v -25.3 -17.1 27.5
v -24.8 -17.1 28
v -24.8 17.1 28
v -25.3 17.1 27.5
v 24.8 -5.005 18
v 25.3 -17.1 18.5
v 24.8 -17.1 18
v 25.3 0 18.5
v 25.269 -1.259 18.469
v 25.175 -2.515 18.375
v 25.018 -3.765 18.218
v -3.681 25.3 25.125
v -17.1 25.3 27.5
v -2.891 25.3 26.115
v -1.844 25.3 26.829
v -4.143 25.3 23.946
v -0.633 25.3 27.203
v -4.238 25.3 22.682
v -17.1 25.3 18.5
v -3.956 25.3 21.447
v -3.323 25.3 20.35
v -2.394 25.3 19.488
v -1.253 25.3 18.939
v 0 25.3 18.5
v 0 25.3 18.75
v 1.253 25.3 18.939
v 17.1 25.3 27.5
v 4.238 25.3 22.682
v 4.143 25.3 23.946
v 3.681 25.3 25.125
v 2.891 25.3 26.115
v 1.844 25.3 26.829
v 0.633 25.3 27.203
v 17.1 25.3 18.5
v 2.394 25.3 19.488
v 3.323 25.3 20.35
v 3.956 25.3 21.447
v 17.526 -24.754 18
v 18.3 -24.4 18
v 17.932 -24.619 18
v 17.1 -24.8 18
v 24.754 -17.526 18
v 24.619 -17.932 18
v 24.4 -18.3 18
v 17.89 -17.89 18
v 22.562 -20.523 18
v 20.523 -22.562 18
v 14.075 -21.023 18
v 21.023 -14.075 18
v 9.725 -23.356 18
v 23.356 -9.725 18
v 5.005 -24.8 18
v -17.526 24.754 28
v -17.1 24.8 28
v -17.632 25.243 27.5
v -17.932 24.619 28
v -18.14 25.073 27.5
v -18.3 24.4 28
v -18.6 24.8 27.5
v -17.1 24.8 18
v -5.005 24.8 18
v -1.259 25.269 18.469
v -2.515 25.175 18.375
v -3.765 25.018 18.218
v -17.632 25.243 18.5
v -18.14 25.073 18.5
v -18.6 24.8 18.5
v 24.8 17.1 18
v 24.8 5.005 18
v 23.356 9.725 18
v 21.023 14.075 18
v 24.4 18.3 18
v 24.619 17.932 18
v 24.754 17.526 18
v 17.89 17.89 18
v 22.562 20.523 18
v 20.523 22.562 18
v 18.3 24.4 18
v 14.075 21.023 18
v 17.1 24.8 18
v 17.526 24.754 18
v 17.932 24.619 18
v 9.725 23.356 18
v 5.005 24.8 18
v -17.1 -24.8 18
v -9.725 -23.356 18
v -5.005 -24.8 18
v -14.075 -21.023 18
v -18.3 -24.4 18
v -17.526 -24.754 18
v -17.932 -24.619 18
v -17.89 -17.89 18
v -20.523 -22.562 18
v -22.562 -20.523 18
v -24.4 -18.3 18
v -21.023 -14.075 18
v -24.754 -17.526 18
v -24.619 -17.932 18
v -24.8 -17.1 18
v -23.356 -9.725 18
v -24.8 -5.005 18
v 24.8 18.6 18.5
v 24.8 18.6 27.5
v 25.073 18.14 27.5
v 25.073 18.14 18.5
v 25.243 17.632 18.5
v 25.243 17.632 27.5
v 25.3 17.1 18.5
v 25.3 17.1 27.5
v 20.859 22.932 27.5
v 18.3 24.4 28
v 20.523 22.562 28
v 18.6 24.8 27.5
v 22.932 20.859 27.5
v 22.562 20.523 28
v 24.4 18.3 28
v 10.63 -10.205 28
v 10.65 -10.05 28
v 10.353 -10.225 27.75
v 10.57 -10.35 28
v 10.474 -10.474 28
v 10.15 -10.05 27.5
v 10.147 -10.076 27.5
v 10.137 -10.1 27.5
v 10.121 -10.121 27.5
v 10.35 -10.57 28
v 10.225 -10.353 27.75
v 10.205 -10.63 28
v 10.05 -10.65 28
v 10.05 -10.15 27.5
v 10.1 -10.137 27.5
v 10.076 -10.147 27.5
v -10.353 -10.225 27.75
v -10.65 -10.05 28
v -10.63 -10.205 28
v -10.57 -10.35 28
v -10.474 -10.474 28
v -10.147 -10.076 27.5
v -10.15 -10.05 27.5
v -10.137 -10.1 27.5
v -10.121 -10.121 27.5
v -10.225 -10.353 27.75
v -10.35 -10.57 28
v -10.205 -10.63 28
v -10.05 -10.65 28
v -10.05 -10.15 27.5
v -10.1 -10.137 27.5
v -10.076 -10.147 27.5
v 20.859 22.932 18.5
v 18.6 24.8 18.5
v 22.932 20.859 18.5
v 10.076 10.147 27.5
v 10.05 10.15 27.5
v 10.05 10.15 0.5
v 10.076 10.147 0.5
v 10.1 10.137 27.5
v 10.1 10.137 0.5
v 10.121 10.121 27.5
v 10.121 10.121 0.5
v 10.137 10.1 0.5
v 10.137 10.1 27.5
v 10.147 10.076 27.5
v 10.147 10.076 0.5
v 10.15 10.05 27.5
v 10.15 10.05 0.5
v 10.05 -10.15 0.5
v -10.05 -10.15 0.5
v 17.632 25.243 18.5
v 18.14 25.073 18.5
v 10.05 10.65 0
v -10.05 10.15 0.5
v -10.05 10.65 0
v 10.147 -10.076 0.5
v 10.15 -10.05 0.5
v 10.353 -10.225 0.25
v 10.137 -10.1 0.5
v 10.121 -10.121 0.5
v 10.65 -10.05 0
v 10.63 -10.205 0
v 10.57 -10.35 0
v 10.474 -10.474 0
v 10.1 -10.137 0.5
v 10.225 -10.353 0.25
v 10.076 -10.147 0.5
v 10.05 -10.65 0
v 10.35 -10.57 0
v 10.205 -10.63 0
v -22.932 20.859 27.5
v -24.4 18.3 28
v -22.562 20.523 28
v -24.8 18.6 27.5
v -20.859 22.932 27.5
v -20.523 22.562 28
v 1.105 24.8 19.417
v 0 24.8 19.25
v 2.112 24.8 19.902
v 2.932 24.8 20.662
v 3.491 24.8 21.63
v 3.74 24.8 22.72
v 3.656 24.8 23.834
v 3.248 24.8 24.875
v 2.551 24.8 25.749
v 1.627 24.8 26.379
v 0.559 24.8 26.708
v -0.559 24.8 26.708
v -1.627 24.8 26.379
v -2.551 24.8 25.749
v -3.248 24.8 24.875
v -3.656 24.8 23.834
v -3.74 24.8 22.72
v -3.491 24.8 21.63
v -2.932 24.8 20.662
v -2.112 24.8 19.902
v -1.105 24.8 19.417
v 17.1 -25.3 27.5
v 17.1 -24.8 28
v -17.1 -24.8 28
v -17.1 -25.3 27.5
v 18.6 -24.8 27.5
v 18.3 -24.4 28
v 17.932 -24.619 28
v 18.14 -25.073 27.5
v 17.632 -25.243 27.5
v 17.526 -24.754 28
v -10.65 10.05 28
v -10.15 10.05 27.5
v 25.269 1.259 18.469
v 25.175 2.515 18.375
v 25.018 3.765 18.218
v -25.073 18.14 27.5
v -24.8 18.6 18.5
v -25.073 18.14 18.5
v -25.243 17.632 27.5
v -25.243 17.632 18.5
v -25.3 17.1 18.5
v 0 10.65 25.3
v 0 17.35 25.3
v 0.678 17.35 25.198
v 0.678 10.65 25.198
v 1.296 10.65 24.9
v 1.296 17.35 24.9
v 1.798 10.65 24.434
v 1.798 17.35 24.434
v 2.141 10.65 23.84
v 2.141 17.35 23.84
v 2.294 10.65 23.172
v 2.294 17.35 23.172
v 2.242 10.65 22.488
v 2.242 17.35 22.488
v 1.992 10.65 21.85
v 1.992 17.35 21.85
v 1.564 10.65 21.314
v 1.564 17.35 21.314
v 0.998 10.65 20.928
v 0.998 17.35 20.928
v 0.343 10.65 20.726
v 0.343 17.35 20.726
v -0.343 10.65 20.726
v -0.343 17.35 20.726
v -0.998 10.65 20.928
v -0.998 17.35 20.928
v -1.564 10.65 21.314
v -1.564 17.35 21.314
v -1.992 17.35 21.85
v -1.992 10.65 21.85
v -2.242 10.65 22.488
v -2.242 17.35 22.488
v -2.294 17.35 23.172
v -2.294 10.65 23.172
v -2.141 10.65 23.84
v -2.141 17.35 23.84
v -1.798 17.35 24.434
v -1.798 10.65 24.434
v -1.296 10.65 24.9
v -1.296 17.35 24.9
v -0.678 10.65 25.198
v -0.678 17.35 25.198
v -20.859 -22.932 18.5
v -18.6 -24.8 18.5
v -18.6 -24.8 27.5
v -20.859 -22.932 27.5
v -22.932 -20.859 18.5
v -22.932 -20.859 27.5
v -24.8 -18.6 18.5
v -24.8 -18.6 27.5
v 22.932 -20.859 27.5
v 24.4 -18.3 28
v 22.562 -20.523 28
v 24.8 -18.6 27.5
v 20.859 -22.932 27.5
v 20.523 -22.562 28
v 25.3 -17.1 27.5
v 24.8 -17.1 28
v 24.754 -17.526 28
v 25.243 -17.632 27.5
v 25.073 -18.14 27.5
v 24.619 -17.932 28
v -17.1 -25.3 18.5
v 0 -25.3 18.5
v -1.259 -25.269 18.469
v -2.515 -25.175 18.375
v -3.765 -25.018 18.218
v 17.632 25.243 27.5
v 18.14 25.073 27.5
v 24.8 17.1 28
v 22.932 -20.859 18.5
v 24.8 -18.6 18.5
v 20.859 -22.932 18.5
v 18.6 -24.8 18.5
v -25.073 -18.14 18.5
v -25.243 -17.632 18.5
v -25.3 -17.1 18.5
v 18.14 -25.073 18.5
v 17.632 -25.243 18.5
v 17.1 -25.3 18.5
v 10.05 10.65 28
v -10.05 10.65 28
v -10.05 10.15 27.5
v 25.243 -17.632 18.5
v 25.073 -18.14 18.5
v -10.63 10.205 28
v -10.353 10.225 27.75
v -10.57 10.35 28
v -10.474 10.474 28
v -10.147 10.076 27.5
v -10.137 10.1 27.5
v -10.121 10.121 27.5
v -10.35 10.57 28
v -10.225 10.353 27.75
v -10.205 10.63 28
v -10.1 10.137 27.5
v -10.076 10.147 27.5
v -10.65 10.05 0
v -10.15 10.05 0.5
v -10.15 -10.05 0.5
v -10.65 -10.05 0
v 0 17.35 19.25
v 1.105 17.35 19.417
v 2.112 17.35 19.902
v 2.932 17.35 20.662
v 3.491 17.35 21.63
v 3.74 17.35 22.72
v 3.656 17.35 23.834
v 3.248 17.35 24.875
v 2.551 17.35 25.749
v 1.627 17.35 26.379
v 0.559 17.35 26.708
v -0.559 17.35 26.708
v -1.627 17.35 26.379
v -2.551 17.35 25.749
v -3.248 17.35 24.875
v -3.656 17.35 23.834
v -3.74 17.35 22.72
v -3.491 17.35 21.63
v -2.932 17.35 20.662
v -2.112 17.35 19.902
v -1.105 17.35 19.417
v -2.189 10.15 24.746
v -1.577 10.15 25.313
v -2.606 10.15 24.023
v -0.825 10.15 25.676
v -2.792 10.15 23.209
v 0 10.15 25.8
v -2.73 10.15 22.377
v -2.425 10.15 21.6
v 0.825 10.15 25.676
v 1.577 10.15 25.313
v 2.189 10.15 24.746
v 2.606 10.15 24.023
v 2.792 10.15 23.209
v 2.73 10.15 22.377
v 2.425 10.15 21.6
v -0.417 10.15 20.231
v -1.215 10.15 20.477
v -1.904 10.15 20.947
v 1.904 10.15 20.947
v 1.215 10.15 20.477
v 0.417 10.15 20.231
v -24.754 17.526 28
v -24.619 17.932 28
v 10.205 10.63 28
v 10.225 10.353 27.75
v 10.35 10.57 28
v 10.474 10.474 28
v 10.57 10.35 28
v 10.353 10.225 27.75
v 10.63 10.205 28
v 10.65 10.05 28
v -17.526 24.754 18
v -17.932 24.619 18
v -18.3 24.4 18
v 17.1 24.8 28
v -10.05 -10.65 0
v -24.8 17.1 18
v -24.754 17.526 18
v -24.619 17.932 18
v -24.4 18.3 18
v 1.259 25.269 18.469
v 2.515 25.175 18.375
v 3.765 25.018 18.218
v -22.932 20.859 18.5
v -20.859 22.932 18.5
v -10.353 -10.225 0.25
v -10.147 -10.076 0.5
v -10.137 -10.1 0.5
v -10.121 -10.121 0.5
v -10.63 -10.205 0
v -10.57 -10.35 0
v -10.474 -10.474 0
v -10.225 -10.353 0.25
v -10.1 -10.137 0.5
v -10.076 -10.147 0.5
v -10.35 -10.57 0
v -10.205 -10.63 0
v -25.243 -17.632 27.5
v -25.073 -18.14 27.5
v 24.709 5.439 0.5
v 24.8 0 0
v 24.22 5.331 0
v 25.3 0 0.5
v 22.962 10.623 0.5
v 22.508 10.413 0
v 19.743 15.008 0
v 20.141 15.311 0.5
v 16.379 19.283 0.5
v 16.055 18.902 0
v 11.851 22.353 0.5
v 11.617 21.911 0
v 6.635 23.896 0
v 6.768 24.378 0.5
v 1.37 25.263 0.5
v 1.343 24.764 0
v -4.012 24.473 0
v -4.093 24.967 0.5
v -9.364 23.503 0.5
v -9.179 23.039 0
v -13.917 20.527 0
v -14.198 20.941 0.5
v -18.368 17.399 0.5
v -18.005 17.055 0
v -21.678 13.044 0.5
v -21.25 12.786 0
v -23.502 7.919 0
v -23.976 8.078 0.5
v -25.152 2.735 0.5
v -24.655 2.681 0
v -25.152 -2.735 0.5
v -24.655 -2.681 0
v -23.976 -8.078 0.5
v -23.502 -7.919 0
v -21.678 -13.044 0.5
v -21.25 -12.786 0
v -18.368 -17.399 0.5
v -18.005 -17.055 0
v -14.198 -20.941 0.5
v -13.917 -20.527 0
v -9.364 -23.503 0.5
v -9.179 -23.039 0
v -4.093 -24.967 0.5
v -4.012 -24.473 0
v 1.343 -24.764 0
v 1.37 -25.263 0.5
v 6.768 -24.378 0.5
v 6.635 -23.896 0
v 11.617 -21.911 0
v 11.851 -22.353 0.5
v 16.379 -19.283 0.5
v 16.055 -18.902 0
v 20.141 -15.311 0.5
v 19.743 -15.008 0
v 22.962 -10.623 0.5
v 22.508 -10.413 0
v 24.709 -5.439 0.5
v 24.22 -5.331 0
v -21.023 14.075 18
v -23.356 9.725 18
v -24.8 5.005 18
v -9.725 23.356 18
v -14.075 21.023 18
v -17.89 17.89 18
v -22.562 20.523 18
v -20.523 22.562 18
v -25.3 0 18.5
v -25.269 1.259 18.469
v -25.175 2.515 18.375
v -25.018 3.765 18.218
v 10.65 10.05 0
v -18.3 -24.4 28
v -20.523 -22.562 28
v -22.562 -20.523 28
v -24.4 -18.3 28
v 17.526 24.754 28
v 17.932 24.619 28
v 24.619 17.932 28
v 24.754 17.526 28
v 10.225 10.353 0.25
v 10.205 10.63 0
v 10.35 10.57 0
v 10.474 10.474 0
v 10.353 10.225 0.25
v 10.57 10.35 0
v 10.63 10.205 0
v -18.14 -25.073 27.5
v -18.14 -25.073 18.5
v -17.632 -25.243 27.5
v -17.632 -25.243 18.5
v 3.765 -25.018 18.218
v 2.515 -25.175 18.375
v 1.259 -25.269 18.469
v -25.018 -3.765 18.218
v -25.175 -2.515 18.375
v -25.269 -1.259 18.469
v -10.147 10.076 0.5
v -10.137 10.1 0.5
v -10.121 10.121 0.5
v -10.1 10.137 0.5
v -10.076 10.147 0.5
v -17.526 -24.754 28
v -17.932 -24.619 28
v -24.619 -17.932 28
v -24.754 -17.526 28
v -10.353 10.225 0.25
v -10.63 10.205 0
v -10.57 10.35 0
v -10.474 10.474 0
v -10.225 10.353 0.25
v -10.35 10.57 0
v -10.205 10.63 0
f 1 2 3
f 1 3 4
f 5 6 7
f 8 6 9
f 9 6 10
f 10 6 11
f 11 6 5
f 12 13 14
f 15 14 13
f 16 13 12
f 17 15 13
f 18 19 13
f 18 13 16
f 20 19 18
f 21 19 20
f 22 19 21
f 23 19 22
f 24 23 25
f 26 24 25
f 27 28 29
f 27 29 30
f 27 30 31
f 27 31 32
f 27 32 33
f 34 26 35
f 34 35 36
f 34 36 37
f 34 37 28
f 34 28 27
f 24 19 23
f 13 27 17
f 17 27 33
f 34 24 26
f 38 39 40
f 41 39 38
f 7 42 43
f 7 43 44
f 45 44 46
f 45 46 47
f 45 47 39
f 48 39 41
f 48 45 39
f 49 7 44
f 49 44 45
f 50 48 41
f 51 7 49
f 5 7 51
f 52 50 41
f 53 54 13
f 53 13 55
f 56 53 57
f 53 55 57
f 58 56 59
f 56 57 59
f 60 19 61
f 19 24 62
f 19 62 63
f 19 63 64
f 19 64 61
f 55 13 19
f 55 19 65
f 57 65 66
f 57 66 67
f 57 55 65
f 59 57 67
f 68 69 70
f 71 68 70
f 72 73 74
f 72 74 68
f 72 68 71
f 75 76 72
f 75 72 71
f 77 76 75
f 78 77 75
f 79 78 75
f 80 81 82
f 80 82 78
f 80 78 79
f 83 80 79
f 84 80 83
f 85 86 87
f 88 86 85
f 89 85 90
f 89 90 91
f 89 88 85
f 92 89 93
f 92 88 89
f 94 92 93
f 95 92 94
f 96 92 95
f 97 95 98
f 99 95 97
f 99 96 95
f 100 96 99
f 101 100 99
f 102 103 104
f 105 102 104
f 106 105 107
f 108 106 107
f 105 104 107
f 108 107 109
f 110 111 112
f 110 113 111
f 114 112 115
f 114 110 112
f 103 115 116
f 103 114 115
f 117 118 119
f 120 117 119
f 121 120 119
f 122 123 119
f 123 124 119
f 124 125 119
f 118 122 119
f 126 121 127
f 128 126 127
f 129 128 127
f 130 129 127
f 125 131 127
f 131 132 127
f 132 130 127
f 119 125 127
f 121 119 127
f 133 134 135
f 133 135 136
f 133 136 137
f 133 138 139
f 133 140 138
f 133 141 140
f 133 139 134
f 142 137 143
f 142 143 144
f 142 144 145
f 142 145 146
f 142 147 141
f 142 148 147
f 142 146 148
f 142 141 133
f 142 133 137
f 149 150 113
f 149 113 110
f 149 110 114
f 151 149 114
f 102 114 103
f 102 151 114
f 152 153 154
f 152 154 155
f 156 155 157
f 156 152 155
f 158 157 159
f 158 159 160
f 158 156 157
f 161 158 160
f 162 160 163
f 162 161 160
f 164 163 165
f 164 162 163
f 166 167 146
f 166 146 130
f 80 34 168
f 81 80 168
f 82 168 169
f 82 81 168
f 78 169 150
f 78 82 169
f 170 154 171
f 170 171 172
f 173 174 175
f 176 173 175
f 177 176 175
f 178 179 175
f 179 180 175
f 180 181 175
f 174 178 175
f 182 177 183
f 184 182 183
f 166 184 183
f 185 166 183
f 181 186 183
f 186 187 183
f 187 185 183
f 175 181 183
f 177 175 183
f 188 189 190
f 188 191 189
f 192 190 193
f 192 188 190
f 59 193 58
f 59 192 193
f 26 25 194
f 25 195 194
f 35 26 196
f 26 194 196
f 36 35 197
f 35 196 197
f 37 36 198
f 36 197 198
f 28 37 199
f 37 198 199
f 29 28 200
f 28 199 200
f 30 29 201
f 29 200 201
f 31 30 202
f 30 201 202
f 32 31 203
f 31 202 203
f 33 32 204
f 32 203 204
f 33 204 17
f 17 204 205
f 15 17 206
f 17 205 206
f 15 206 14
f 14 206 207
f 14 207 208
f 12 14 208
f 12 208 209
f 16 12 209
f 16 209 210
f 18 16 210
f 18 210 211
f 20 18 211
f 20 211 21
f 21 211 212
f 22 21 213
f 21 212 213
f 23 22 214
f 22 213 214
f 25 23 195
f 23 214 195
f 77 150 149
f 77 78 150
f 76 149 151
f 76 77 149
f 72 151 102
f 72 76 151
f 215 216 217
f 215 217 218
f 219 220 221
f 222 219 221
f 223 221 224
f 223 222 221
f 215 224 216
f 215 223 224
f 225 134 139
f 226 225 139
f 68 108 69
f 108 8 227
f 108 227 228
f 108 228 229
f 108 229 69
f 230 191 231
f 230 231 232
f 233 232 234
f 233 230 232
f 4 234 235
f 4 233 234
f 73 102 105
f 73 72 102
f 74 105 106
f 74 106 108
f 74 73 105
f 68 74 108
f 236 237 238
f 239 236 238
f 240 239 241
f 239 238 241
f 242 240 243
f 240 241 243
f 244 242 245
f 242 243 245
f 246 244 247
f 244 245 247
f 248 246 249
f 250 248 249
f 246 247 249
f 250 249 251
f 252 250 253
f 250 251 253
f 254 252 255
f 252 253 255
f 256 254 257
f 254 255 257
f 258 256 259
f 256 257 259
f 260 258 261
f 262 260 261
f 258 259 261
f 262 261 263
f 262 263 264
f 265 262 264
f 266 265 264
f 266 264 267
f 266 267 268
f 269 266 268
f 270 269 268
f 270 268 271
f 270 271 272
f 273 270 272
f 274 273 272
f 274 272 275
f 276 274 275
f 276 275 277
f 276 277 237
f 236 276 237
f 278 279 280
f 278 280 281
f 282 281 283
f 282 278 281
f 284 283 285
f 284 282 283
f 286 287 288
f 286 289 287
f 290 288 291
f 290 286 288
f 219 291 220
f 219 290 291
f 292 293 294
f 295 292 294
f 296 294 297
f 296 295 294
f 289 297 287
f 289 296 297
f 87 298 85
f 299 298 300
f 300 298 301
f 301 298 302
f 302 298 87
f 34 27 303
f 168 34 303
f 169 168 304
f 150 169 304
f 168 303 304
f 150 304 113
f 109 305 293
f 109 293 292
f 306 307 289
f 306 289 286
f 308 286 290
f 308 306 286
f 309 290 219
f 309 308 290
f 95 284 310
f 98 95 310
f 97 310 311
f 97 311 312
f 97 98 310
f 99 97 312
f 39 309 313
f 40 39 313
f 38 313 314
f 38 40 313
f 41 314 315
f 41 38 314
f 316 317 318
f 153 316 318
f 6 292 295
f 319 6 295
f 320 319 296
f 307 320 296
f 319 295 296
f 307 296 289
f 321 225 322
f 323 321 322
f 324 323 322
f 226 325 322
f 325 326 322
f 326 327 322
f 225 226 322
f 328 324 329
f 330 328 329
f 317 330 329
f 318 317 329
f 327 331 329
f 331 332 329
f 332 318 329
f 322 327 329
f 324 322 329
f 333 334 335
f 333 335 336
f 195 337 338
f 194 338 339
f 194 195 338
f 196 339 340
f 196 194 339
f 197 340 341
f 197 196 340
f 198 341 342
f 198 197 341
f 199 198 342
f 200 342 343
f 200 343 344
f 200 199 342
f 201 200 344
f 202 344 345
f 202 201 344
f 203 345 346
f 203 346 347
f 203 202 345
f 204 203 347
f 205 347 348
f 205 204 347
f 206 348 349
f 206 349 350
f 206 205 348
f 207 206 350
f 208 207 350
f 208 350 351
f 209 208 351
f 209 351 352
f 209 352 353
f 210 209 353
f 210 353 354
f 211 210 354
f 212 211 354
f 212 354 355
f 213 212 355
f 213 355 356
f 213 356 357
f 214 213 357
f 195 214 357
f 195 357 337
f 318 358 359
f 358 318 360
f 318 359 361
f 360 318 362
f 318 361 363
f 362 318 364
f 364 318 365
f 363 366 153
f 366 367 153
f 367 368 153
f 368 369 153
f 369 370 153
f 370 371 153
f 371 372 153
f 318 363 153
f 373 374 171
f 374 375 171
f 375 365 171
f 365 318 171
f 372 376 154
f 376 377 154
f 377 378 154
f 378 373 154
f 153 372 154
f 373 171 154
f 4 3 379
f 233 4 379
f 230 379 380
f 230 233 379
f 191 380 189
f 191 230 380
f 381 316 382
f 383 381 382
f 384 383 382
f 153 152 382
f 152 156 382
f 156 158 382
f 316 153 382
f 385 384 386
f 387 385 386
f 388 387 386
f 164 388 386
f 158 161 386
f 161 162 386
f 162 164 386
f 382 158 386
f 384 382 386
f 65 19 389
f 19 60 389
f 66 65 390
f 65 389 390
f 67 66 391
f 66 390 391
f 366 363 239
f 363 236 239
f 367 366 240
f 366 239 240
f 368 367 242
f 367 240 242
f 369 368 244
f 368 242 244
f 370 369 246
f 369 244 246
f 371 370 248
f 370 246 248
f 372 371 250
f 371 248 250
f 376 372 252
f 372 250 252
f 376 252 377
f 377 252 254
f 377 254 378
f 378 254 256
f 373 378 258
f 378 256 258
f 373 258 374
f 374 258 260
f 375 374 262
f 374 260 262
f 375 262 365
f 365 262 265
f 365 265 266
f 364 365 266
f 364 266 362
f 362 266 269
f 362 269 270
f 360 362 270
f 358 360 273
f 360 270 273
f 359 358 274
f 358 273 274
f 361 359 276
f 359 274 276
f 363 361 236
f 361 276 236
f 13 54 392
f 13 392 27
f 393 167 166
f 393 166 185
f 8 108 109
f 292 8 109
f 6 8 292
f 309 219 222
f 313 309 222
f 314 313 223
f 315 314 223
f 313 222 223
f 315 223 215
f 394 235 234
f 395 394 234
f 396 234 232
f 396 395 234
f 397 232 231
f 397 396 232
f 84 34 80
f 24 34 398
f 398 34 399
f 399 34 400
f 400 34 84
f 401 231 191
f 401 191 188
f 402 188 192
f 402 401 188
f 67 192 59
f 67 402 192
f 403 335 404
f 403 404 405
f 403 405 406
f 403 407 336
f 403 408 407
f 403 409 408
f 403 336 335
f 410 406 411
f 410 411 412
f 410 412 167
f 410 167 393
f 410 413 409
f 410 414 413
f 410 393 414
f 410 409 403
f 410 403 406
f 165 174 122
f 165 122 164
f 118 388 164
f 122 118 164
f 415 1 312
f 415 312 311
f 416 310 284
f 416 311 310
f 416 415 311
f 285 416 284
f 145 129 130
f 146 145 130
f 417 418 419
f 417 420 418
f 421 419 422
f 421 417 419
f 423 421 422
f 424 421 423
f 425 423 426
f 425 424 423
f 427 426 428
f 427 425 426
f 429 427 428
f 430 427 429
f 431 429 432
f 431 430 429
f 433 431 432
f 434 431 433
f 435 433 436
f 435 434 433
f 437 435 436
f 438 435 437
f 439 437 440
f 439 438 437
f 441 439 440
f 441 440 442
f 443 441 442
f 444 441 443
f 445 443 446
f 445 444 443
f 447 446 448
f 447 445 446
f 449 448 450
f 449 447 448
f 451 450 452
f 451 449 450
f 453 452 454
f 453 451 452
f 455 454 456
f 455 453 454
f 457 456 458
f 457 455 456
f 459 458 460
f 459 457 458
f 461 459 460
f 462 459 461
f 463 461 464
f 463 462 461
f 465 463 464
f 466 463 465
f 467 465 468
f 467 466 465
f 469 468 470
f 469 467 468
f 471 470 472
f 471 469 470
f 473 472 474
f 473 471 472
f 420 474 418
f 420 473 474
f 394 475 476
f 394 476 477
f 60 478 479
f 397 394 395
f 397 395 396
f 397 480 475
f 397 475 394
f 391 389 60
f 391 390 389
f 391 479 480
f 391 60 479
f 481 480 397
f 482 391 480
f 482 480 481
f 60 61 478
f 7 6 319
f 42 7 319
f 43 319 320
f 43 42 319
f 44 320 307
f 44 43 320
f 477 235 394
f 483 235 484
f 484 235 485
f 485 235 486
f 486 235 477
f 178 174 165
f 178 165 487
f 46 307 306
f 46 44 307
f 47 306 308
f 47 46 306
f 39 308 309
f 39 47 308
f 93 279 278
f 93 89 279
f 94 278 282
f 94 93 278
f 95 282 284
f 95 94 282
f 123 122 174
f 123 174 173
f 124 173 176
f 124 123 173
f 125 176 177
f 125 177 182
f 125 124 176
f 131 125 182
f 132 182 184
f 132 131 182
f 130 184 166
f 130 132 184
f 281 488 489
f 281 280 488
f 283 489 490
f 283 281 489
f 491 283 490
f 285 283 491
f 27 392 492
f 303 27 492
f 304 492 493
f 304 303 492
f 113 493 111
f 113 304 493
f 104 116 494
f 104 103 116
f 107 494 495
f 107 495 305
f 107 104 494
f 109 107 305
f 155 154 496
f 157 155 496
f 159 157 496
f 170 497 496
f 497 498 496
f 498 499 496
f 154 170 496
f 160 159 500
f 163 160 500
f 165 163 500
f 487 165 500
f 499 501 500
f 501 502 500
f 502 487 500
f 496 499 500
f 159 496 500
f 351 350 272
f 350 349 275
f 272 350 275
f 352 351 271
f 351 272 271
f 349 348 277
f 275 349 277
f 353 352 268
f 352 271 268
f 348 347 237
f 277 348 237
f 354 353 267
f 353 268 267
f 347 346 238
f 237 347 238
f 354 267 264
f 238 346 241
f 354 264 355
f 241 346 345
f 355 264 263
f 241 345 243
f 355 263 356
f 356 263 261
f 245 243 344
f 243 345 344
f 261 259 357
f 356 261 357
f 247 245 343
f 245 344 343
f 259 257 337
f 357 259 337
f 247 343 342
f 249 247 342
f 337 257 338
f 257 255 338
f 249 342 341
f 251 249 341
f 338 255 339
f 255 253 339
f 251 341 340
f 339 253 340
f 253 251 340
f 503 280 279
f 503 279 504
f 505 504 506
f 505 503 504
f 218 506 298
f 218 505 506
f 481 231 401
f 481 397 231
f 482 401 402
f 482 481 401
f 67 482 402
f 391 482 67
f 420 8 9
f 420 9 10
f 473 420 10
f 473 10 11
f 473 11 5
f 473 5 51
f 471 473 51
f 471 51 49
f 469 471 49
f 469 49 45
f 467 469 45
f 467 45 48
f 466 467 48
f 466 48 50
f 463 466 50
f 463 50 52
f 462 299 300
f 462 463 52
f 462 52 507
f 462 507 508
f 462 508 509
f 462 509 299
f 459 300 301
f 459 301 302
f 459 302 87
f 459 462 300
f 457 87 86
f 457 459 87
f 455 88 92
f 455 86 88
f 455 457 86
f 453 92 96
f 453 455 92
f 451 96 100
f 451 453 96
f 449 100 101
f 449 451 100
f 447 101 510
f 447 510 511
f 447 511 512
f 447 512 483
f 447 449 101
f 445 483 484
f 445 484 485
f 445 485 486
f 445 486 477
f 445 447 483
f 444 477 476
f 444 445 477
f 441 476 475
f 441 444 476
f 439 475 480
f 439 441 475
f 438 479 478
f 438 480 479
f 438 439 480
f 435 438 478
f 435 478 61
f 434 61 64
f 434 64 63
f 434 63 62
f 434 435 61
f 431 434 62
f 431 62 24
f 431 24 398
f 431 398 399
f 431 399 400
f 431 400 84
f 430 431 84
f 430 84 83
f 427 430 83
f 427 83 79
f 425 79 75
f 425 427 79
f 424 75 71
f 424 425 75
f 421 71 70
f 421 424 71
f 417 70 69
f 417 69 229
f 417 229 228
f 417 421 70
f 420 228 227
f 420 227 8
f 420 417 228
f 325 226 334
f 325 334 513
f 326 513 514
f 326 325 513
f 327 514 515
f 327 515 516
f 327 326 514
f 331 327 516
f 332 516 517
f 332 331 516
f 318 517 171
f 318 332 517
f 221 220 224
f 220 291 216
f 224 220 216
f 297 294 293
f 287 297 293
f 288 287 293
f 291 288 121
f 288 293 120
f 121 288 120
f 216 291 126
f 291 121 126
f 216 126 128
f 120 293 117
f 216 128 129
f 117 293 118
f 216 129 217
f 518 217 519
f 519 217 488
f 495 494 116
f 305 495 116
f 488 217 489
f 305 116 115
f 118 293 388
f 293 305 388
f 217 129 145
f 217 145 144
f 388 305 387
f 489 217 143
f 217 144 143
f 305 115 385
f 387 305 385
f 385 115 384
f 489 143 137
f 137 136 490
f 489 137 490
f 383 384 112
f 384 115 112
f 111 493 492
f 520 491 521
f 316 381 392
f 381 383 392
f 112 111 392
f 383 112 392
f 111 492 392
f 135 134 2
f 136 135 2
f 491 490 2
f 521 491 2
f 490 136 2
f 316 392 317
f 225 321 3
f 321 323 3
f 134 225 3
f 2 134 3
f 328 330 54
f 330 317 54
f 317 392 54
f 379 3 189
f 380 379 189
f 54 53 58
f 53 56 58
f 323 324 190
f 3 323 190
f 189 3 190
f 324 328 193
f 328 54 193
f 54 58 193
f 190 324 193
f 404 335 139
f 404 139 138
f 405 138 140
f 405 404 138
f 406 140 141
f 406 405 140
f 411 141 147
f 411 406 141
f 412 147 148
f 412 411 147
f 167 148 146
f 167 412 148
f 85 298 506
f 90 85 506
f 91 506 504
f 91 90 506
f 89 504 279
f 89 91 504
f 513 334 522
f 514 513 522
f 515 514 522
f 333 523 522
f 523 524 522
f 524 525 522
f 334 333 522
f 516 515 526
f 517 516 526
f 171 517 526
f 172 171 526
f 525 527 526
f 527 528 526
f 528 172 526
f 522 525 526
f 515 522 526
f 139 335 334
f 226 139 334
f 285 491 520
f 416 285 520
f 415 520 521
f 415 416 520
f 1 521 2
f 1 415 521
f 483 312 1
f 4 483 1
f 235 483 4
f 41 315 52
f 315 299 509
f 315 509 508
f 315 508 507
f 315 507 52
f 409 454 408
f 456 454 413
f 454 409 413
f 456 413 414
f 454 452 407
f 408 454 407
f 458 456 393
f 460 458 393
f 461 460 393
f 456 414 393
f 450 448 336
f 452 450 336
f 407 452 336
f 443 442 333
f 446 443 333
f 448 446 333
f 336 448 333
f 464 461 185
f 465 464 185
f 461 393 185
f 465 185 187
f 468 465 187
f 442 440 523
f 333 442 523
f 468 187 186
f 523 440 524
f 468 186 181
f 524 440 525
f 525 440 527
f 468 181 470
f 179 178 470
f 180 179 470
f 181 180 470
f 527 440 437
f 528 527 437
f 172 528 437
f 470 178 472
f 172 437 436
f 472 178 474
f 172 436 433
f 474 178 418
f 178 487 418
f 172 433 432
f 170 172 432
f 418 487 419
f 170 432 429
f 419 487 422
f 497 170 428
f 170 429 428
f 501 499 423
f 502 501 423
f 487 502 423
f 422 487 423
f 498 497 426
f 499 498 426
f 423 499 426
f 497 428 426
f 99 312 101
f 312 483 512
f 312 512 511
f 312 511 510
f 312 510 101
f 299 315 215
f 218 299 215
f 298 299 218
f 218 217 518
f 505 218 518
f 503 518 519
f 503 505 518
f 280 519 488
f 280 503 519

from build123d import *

# Parameters (mm, degrees)
SKIZZE1_R                       = 25.3
SKIZZE1_W                       = 20.3
SKIZZE1_H                       = 20.3
AUFSATZ_LINEAR_AUSTRAGEN1_DEPTH = 18
SKIZZE2_W                       = 20.3
SKIZZE2_H                       = 20.3
AUFSATZ_LINEAR_AUSTRAGEN2_DEPTH = 10
SCHNITT_LINEAR_AUSTRAGEN1_REACH = 65.122
SKIZZE3_R                       = 2.3
CUT_EXTRUDE2_START              = -50.6
SKETCH1_2_R                     = 3.75
CUT_EXTRUDE2_DEPTH              = 7.95
VERRUNDUNG1_R                   = 0.1
VERRUNDUNG2_R                   = 2.5
FASE1_SIZE                      = 0.5


with BuildPart() as part:
    # Skizze1 → Aufsatz-Linear austragen1 (new body)
    with BuildSketch(Plane.XY):
        Circle(SKIZZE1_R)
        Rectangle(SKIZZE1_W, SKIZZE1_H, mode=Mode.SUBTRACT)
    extrude(amount=AUFSATZ_LINEAR_AUSTRAGEN1_DEPTH)

    # Skizze2 → Aufsatz-Linear austragen2 (add)
    with BuildSketch(Plane.XY.offset(18)):
        with BuildLine():
            Line((-17.913961036, 25.3), (17.913961036, 25.3))
            ThreePointArc((17.913961036, 25.3), (21.920310217, 21.920310217), (25.3, 17.913961036))
            Line((25.3, 17.913961036), (25.3, -17.913961036))
            ThreePointArc((25.3, -17.913961036), (21.920310217, -21.920310217), (17.913961036, -25.3))
            Line((17.913961036, -25.3), (-17.913961036, -25.3))
            ThreePointArc((-17.913961036, -25.3), (-21.920310217, -21.920310217), (-25.3, -17.913961036))
            Line((-25.3, -17.913961036), (-25.3, 17.913961036))
            ThreePointArc((-25.3, 17.913961036), (-21.920310217, 21.920310217), (-17.913961036, 25.3))
        make_face()
        Rectangle(SKIZZE2_W, SKIZZE2_H, mode=Mode.SUBTRACT)
    extrude(amount=AUFSATZ_LINEAR_AUSTRAGEN2_DEPTH)

    # Skizze3 → Schnitt-Linear austragen1 (cut, up to next)
    with BuildSketch(Plane(origin=(0, 25.3, 0), x_dir=(1, 0, 0), z_dir=(0, 1, 0)), mode=Mode.PRIVATE) as schnitt_linear_austragen1_sk1:
        with Locations(Location((0, -23, 0), (0, 0, 270))):
            Circle(SKIZZE3_R)
    schnitt_linear_austragen1_tool1 = extrude(schnitt_linear_austragen1_sk1.sketch, amount=-SCHNITT_LINEAR_AUSTRAGEN1_REACH, mode=Mode.PRIVATE) & part.part
    add(schnitt_linear_austragen1_tool1.solids().sort_by_distance((0, 25.3, 23))[0], mode=Mode.SUBTRACT)

    # Sketch1<2> → Cut-Extrude2 (cut)
    with BuildSketch(Plane.XZ.offset(25.3).offset(CUT_EXTRUDE2_START)):
        with Locations(Location((0, 23, 0), (0, 0, 270))):
            Circle(SKETCH1_2_R)
    extrude(amount=CUT_EXTRUDE2_DEPTH, mode=Mode.SUBTRACT)

    # Verrundung1
    verrundung1_edges = [part.edges().sort_by_distance(p)[0] for p in [
        (10.15, -10.15, 14),
        (10.15, 10.15, 14),
        (-10.15, 10.15, 14),
        (-10.15, -10.15, 14),
    ]]
    fillet(verrundung1_edges, radius=VERRUNDUNG1_R)

    # Verrundung2
    verrundung2_edges = [part.edges().sort_by_distance(p)[0] for p in [
        (-17.913961036, 25.3, 23),
        (-25.3, 17.913961036, 23),
        (-25.3, -17.913961036, 23),
        (-17.913961036, -25.3, 23),
        (17.913961036, -25.3, 23),
        (25.3, -17.913961036, 23),
        (25.3, 17.913961036, 23),
        (17.913961036, 25.3, 23),
    ]]
    fillet(verrundung2_edges, radius=VERRUNDUNG2_R)

    # Fase1
    # the kernel refuses this chamfer: 0.5 mm, written as the material it takes off along each edge
    with BuildSketch(Plane(origin=(-22.8, -17.1, 18), x_dir=(-0.8000000000000012, -0.5999999999999983, 0), z_dir=(0.5999999999999983, -0.8000000000000012, 0))) as fase1_piece_1:
        Polygon((2.5, -FASE1_SIZE), (2.5 - FASE1_SIZE, 0), (2.5, 0), align=None)
    revolve(axis=Axis((-22.8, -17.1, 18), (0, 0, -1)), revolution_arc=36.869897646, mode=Mode.SUBTRACT)
    with BuildSketch(Plane(origin=(-25.3, 8.3e-08, 18), x_dir=(-0.027495876610589005, 0, 0.9996219169112968), z_dir=(0, 1, 0))) as fase1_piece_2_section:
        Polygon((FASE1_SIZE * 0.999621916911, FASE1_SIZE * 0.0274958766106), (-FASE1_SIZE * 0.0274958766106, FASE1_SIZE * 0.999621916911), (0, 0), align=None)
    fase1_piece_2 = extrude(amount=17.099999917, mode=Mode.PRIVATE)
    fase1_piece_2 = fase1_piece_2 - Plane(origin=(0, 0, 18.17274178), x_dir=(1, 0, 0), z_dir=(0, 0, -1)) * Cylinder(25.3, 37, mode=Mode.PRIVATE)
    add(fase1_piece_2, mode=Mode.SUBTRACT)
    with BuildSketch(Plane(origin=(-25.3, -17.1, 28), x_dir=(0.9996219169112968, 0, 0.027495876610589005), z_dir=(0, 1, 0)), Plane(origin=(17.1, -25.3, 28), x_dir=(0, 0.9996219169112968, 0.027495876610589005), z_dir=(-1, 0, 0)), Plane(origin=(25.3, 17.1, 28), x_dir=(-0.9996219169112968, 0, 0.027495876610589005), z_dir=(0, -1, 0)), Plane(origin=(-17.1, 25.3, 28), x_dir=(0, -0.9996219169112968, 0.027495876610589005), z_dir=(1, 0, 0))) as fase1_piece_3:
        Polygon((FASE1_SIZE * 0.999621916911, FASE1_SIZE * 0.0274958766106), (-FASE1_SIZE * 0.0274958766106, FASE1_SIZE * 0.999621916911), (0, 0), align=None)
    extrude(amount=34.2, mode=Mode.SUBTRACT)
    with BuildSketch(Plane(origin=(0, 0, 28), x_dir=(-0.8000000000000004, 0.5999999999999995, 0), z_dir=(-0.5999999999999995, -0.8000000000000004, 0))) as fase1_piece_4:
        Polygon((31 - FASE1_SIZE, 0), (31, FASE1_SIZE), (31, 0), align=None)
    revolve(axis=Axis((0, 0, 28), (0, 0, -1)), revolution_arc=16.260204708, mode=Mode.SUBTRACT)
    with BuildSketch(Plane(origin=(0, 0, 28), x_dir=(0.8, -0.5999999999999999, 0), z_dir=(0.5999999999999999, 0.8, 0))) as fase1_piece_5:
        Polygon((31 - FASE1_SIZE, 0), (31, FASE1_SIZE), (31, 0), align=None)
    revolve(axis=Axis((0, 0, 28), (0, 0, -1)), revolution_arc=16.260204708, mode=Mode.SUBTRACT)
    with BuildSketch(Plane(origin=(0, 0, 28), x_dir=(0.5999999999999996, 0.8000000000000003, 0), z_dir=(-0.8000000000000003, 0.5999999999999996, 0))) as fase1_piece_6:
        Polygon((31 - FASE1_SIZE, 0), (31, FASE1_SIZE), (31, 0), align=None)
    revolve(axis=Axis((0, 0, 28), (0, 0, -1)), revolution_arc=16.260204708, mode=Mode.SUBTRACT)
    with BuildSketch(Plane(origin=(-17.1, 22.8, 28), x_dir=(0, 1, 0), z_dir=(1, 0, 0))) as fase1_piece_7:
        Polygon((2.5 - FASE1_SIZE, 0), (2.5, -FASE1_SIZE), (2.5, 0), align=None)
    revolve(axis=Axis((-17.1, 22.8, 28), (0, 0, 1)), revolution_arc=36.869897646, mode=Mode.SUBTRACT)
    with BuildSketch(Plane(origin=(-22.8, 17.1, 28), x_dir=(-1, 0, 0), z_dir=(0, -1, 0))) as fase1_piece_8:
        Polygon((2.5 - FASE1_SIZE, 0), (2.5, FASE1_SIZE), (2.5, 0), align=None)
    revolve(axis=Axis((-22.8, 17.1, 28), (0, 0, -1)), revolution_arc=36.869897646, mode=Mode.SUBTRACT)
    with BuildSketch(Plane(origin=(17.1, 22.8, 28), x_dir=(0, 1, 0), z_dir=(-1, 0, 0))) as fase1_piece_9:
        Polygon((2.5 - FASE1_SIZE, 0), (2.5, FASE1_SIZE), (2.5, 0), align=None)
    revolve(axis=Axis((17.1, 22.8, 28), (0, 0, -1)), revolution_arc=36.869897646, mode=Mode.SUBTRACT)
    with BuildSketch(Plane(origin=(22.8, 17.1, 28), x_dir=(0.8, 0.6, 0), z_dir=(-0.6, 0.8, 0))) as fase1_piece_10:
        Polygon((2.5 - FASE1_SIZE, 0), (2.5, FASE1_SIZE), (2.5, 0), align=None)
    revolve(axis=Axis((22.8, 17.1, 28), (0, 0, -1)), revolution_arc=36.869897646, mode=Mode.SUBTRACT)
    with BuildSketch(Plane(origin=(22.8, -17.1, 28), x_dir=(1, 0, 0), z_dir=(0, 1, 0))) as fase1_piece_11:
        Polygon((2.5 - FASE1_SIZE, 0), (2.5, FASE1_SIZE), (2.5, 0), align=None)
    revolve(axis=Axis((22.8, -17.1, 28), (0, 0, -1)), revolution_arc=36.869897646, mode=Mode.SUBTRACT)
    with BuildSketch(Plane(origin=(17.1, -22.8, 28), x_dir=(0.6000000000000009, -0.7999999999999993, 0), z_dir=(0.7999999999999993, 0.6000000000000009, 0))) as fase1_piece_12:
        Polygon((2.5 - FASE1_SIZE, 0), (2.5, FASE1_SIZE), (2.5, 0), align=None)
    revolve(axis=Axis((17.1, -22.8, 28), (0, 0, -1)), revolution_arc=36.869897646, mode=Mode.SUBTRACT)
    with BuildSketch(Plane(origin=(-17.1, -22.8, 28), x_dir=(0, -1, 0), z_dir=(1, 0, 0))) as fase1_piece_13:
        Polygon((2.5 - FASE1_SIZE, 0), (2.5, FASE1_SIZE), (2.5, 0), align=None)
    revolve(axis=Axis((-17.1, -22.8, 28), (0, 0, -1)), revolution_arc=36.869897646, mode=Mode.SUBTRACT)
    with BuildSketch(Plane(origin=(-22.8, -17.1, 28), x_dir=(-0.8000000000000012, -0.5999999999999983, 0), z_dir=(0.5999999999999983, -0.8000000000000012, 0))) as fase1_piece_14:
        Polygon((2.5 - FASE1_SIZE, 0), (2.5, FASE1_SIZE), (2.5, 0), align=None)
    revolve(axis=Axis((-22.8, -17.1, 28), (0, 0, -1)), revolution_arc=36.869897646, mode=Mode.SUBTRACT)
    with BuildSketch(Plane(origin=(0, 0, 18), x_dir=(0.8, -0.5999999999999999, 0), z_dir=(0.5999999999999999, 0.8, 0))) as fase1_piece_15:
        Polygon((31, -FASE1_SIZE), (31 - FASE1_SIZE, 0), (31, 0), align=None)
    revolve(axis=Axis((0, 0, 18), (0, 0, -1)), revolution_arc=16.260204708, mode=Mode.SUBTRACT)
    with BuildSketch(Plane(origin=(25.3, 0, 18), x_dir=(0.027495876610589005, 0, 0.9996219169112968), z_dir=(0, -1, 0))) as fase1_piece_16_section:
        Polygon((FASE1_SIZE * 0.999621916911, FASE1_SIZE * 0.0274958766106), (-FASE1_SIZE * 0.0274958766106, FASE1_SIZE * 0.999621916911), (0, 0), align=None)
    fase1_piece_16 = extrude(amount=17.1, mode=Mode.PRIVATE)
    fase1_piece_16 = fase1_piece_16 - Plane(origin=(0, 0, 18.172741783), x_dir=(1, 0, 0), z_dir=(0, 0, -1)) * Cylinder(25.3, 37, mode=Mode.PRIVATE)
    add(fase1_piece_16, mode=Mode.SUBTRACT)
    with BuildSketch(Plane(origin=(22.8, -17.1, 18), x_dir=(1, 0, 0), z_dir=(0, 1, 0))) as fase1_piece_17:
        Polygon((2.5, -FASE1_SIZE), (2.5 - FASE1_SIZE, 0), (2.5, 0), align=None)
    revolve(axis=Axis((22.8, -17.1, 18), (0, 0, -1)), revolution_arc=36.869897646, mode=Mode.SUBTRACT)
    with BuildSketch(Plane(origin=(17.1, -22.8, 18), x_dir=(0.6000000000000009, -0.7999999999999993, 0), z_dir=(0.7999999999999993, 0.6000000000000009, 0))) as fase1_piece_18:
        Polygon((2.5, -FASE1_SIZE), (2.5 - FASE1_SIZE, 0), (2.5, 0), align=None)
    revolve(axis=Axis((17.1, -22.8, 18), (0, 0, -1)), revolution_arc=36.869897646, mode=Mode.SUBTRACT)
    with BuildSketch(Plane(origin=(0, 0, 18), x_dir=(0.5999999999999996, 0.8000000000000003, 0), z_dir=(-0.8000000000000003, 0.5999999999999996, 0))) as fase1_piece_19:
        Polygon((31, -FASE1_SIZE), (31 - FASE1_SIZE, 0), (31, 0), align=None)
    revolve(axis=Axis((0, 0, 18), (0, 0, -1)), revolution_arc=16.260204708, mode=Mode.SUBTRACT)
    with BuildSketch(Plane(origin=(0, 25.3, 18), x_dir=(0, 0.027495876610589005, 0.9996219169112968), z_dir=(1, 0, 0))) as fase1_piece_20_section:
        Polygon((FASE1_SIZE * 0.999621916911, FASE1_SIZE * 0.0274958766106), (-FASE1_SIZE * 0.0274958766106, FASE1_SIZE * 0.999621916911), (0, 0), align=None)
    fase1_piece_20 = extrude(amount=17.1, mode=Mode.PRIVATE)
    fase1_piece_20 = fase1_piece_20 - Plane(origin=(0, 0, 18.17274178), x_dir=(1, 0, 0), z_dir=(0, 0, -1)) * Cylinder(25.3, 37, mode=Mode.PRIVATE)
    add(fase1_piece_20, mode=Mode.SUBTRACT)
    with BuildSketch(Plane(origin=(17.1, 22.8, 18), x_dir=(0, 1, 0), z_dir=(-1, 0, 0))) as fase1_piece_21:
        Polygon((2.5, -FASE1_SIZE), (2.5 - FASE1_SIZE, 0), (2.5, 0), align=None)
    revolve(axis=Axis((17.1, 22.8, 18), (0, 0, -1)), revolution_arc=36.869897646, mode=Mode.SUBTRACT)
    with BuildSketch(Plane(origin=(22.8, 17.1, 18), x_dir=(0.8, 0.6, 0), z_dir=(-0.6, 0.8, 0))) as fase1_piece_22:
        Polygon((2.5, -FASE1_SIZE), (2.5 - FASE1_SIZE, 0), (2.5, 0), align=None)
    revolve(axis=Axis((22.8, 17.1, 18), (0, 0, -1)), revolution_arc=36.869897646, mode=Mode.SUBTRACT)
    with BuildSketch(Plane(origin=(0, 0, 18), x_dir=(-0.8000000000000004, 0.5999999999999995, 0), z_dir=(-0.5999999999999995, -0.8000000000000004, 0))) as fase1_piece_23:
        Polygon((31, -FASE1_SIZE), (31 - FASE1_SIZE, 0), (31, 0), align=None)
    revolve(axis=Axis((0, 0, 18), (0, 0, -1)), revolution_arc=16.260204708, mode=Mode.SUBTRACT)
    with BuildSketch(Plane(origin=(-17.1, 22.8, 18), x_dir=(0, 1, 0), z_dir=(1, 0, 0))) as fase1_piece_24:
        Polygon((2.5, FASE1_SIZE), (2.5 - FASE1_SIZE, 0), (2.5, 0), align=None)
    revolve(axis=Axis((-17.1, 22.8, 18), (0, 0, 1)), revolution_arc=36.869897646, mode=Mode.SUBTRACT)
    with BuildSketch(Plane(origin=(-22.8, 17.1, 18), x_dir=(-1, 0, 0), z_dir=(0, -1, 0))) as fase1_piece_25:
        Polygon((2.5, -FASE1_SIZE), (2.5 - FASE1_SIZE, 0), (2.5, 0), align=None)
    revolve(axis=Axis((-22.8, 17.1, 18), (0, 0, -1)), revolution_arc=36.869897646, mode=Mode.SUBTRACT)
    with BuildSketch(Plane(origin=(0, 0, 0), x_dir=(1, 0, 0), z_dir=(0, -1, 0))) as fase1_piece_26:
        Polygon((25.3 - FASE1_SIZE, 0), (25.3, FASE1_SIZE), (25.3, 0), align=None)
    revolve(axis=Axis((0, 0, 0), (0, 0, 1)), mode=Mode.SUBTRACT)
    with BuildSketch(Plane(origin=(-25.3, -17.1, 18), x_dir=(-0.027495876610589005, 0, 0.9996219169112968), z_dir=(0, 1, 0))) as fase1_piece_27_section:
        Polygon((FASE1_SIZE * 0.999621916911, FASE1_SIZE * 0.0274958766106), (-FASE1_SIZE * 0.0274958766106, FASE1_SIZE * 0.999621916911), (0, 0), align=None)
    fase1_piece_27 = extrude(amount=17.100000083, mode=Mode.PRIVATE)
    fase1_piece_27 = fase1_piece_27 - Plane(origin=(0, 0, 18.17274177), x_dir=(1, 0, 0), z_dir=(0, 0, -1)) * Cylinder(25.3, 37, mode=Mode.PRIVATE)
    add(fase1_piece_27, mode=Mode.SUBTRACT)
    with BuildSketch(Plane(origin=(17.1, -25.3, 18), x_dir=(0, -0.027495876610589005, 0.9996219169112968), z_dir=(-1, 0, 0))) as fase1_piece_28_section:
        Polygon((FASE1_SIZE * 0.999621916911, FASE1_SIZE * 0.0274958766106), (-FASE1_SIZE * 0.0274958766106, FASE1_SIZE * 0.999621916911), (0, 0), align=None)
    fase1_piece_28 = extrude(amount=17.099999919, mode=Mode.PRIVATE)
    fase1_piece_28 = fase1_piece_28 - Plane(origin=(0, 0, 18.17274177), x_dir=(1, 0, 0), z_dir=(0, 0, -1)) * Cylinder(25.3, 37, mode=Mode.PRIVATE)
    add(fase1_piece_28, mode=Mode.SUBTRACT)
    with BuildSketch(Plane(origin=(25.3, 17.1, 18), x_dir=(0.027495876610589005, 0, 0.9996219169112968), z_dir=(0, -1, 0))) as fase1_piece_29_section:
        Polygon((FASE1_SIZE * 0.999621916911, FASE1_SIZE * 0.0274958766106), (-FASE1_SIZE * 0.0274958766106, FASE1_SIZE * 0.999621916911), (0, 0), align=None)
    fase1_piece_29 = extrude(amount=17.1, mode=Mode.PRIVATE)
    fase1_piece_29 = fase1_piece_29 - Plane(origin=(0, 0, 18.17274177), x_dir=(1, 0, 0), z_dir=(0, 0, -1)) * Cylinder(25.3, 37, mode=Mode.PRIVATE)
    add(fase1_piece_29, mode=Mode.SUBTRACT)
    with BuildSketch(Plane(origin=(-17.1, 25.3, 18), x_dir=(0, 0.027495876610589005, 0.9996219169112968), z_dir=(1, 0, 0))) as fase1_piece_30_section:
        Polygon((FASE1_SIZE * 0.999621916911, FASE1_SIZE * 0.0274958766106), (-FASE1_SIZE * 0.0274958766106, FASE1_SIZE * 0.999621916911), (0, 0), align=None)
    fase1_piece_30 = extrude(amount=17.1, mode=Mode.PRIVATE)
    fase1_piece_30 = fase1_piece_30 - Plane(origin=(0, 0, 18.172741783), x_dir=(1, 0, 0), z_dir=(0, 0, -1)) * Cylinder(25.3, 37, mode=Mode.PRIVATE)
    add(fase1_piece_30, mode=Mode.SUBTRACT)
    with BuildSketch(Plane(origin=(0, 10.15, 23), x_dir=(0, 0, 1), z_dir=(-1, 0, 0))) as fase1_piece_31:
        Polygon((2.3 + FASE1_SIZE, 0), (2.3, FASE1_SIZE), (2.3, 0), align=None)
    revolve(axis=Axis((0, 10.15, 23), (0, 1, 0)), mode=Mode.SUBTRACT)
    with BuildSketch(Plane(origin=(0, 25.3, 23), x_dir=(0, 0, -1), z_dir=(-1, 0, 0))) as fase1_piece_32:
        Polygon((3.75 + FASE1_SIZE, 0), (3.75, FASE1_SIZE), (3.75, 0), align=None)
    revolve(axis=Axis((0, 25.3, 23), (0, -1, 0)), mode=Mode.SUBTRACT)
    with BuildSketch(Plane(origin=(-10.05, -10.15, 0), x_dir=(0, 0.02749587661058563, 0.9996219169112968), z_dir=(1, 0, 0)), Plane(origin=(-10.05, -10.15, 28), x_dir=(0, -0.9996219169112968, 0.0274958766105891), z_dir=(1, 0, 0)), Plane(origin=(10.15, -10.05, 0), x_dir=(-0.02749587661058563, 0, 0.9996219169112968), z_dir=(0, 1, 0)), Plane(origin=(10.15, -10.05, 28), x_dir=(0.9996219169112968, 0, 0.0274958766105891), z_dir=(0, 1, 0)), Plane(origin=(-10.15, 10.05, 0), x_dir=(0.02749587661058563, 0, 0.9996219169112968), z_dir=(0, -1, 0)), Plane(origin=(-10.15, 10.05, 28), x_dir=(-0.9996219169112968, 0, 0.0274958766105891), z_dir=(0, -1, 0)), Plane(origin=(10.05, 10.15, 0), x_dir=(0, -0.02749587661058563, 0.9996219169112968), z_dir=(-1, 0, 0)), Plane(origin=(10.05, 10.15, 28), x_dir=(0, 0.9996219169112968, 0.0274958766105891), z_dir=(-1, 0, 0))) as fase1_piece_33:
        Polygon((FASE1_SIZE * 0.999621916911, FASE1_SIZE * 0.0274958766106), (-FASE1_SIZE * 0.0274958766106, FASE1_SIZE * 0.999621916911), (0, 0), align=None)
    extrude(amount=20.1, mode=Mode.SUBTRACT)
    with BuildSketch(Plane(origin=(10.05, -10.05, 0), x_dir=(1, 0, 0), z_dir=(0, 1, 0))) as fase1_piece_34:
        Polygon((0.1, -FASE1_SIZE), (0.1 + FASE1_SIZE, 0), (0.1, 0), align=None)
    revolve(axis=Axis((10.05, -10.05, 0), (0, 0, -1)), revolution_arc=90, mode=Mode.SUBTRACT)
    with BuildSketch(Plane(origin=(10.05, -10.05, 28), x_dir=(1, 0, 0), z_dir=(0, 1, 0))) as fase1_piece_35:
        Polygon((0.1 + FASE1_SIZE, 0), (0.1, FASE1_SIZE), (0.1, 0), align=None)
    revolve(axis=Axis((10.05, -10.05, 28), (0, 0, -1)), revolution_arc=90, mode=Mode.SUBTRACT)
    with BuildSketch(Plane(origin=(-10.05, -10.05, 0), x_dir=(-1, 0, 0), z_dir=(0, 1, 0))) as fase1_piece_36:
        Polygon((0.1, FASE1_SIZE), (0.1 + FASE1_SIZE, 0), (0.1, 0), align=None)
    revolve(axis=Axis((-10.05, -10.05, 0), (0, 0, 1)), revolution_arc=90, mode=Mode.SUBTRACT)
    with BuildSketch(Plane(origin=(-10.05, -10.05, 28), x_dir=(-1, 0, 0), z_dir=(0, 1, 0))) as fase1_piece_37:
        Polygon((0.1 + FASE1_SIZE, 0), (0.1, -FASE1_SIZE), (0.1, 0), align=None)
    revolve(axis=Axis((-10.05, -10.05, 28), (0, 0, 1)), revolution_arc=90, mode=Mode.SUBTRACT)
    with BuildSketch(Plane(origin=(-10.05, 10.05, 0), x_dir=(-1, 0, 0), z_dir=(0, -1, 0))) as fase1_piece_38:
        Polygon((0.1, -FASE1_SIZE), (0.1 + FASE1_SIZE, 0), (0.1, 0), align=None)
    revolve(axis=Axis((-10.05, 10.05, 0), (0, 0, -1)), revolution_arc=90, mode=Mode.SUBTRACT)
    with BuildSketch(Plane(origin=(-10.05, 10.05, 28), x_dir=(-1, 0, 0), z_dir=(0, -1, 0))) as fase1_piece_39:
        Polygon((0.1 + FASE1_SIZE, 0), (0.1, FASE1_SIZE), (0.1, 0), align=None)
    revolve(axis=Axis((-10.05, 10.05, 28), (0, 0, -1)), revolution_arc=90, mode=Mode.SUBTRACT)
    with BuildSketch(Plane(origin=(10.05, 10.05, 0), x_dir=(0, 1, 0), z_dir=(-1, 0, 0))) as fase1_piece_40:
        Polygon((0.1, -FASE1_SIZE), (0.1 + FASE1_SIZE, 0), (0.1, 0), align=None)
    revolve(axis=Axis((10.05, 10.05, 0), (0, 0, -1)), revolution_arc=90, mode=Mode.SUBTRACT)
    with BuildSketch(Plane(origin=(10.05, 10.05, 28), x_dir=(0, 1, 0), z_dir=(-1, 0, 0))) as fase1_piece_41:
        Polygon((0.1 + FASE1_SIZE, 0), (0.1, FASE1_SIZE), (0.1, 0), align=None)
    revolve(axis=Axis((10.05, 10.05, 28), (0, 0, -1)), revolution_arc=90, mode=Mode.SUBTRACT)
    with BuildSketch(Plane(origin=(0, 0, 18), x_dir=(-0.5999999999999953, -0.8000000000000035, 0), z_dir=(0.8000000000000035, -0.5999999999999953, 0))) as fase1_piece_42:
        Polygon((31, -FASE1_SIZE), (31 - FASE1_SIZE, 0), (31, 0), align=None)
    revolve(axis=Axis((0, 0, 18), (0, 0, -1)), revolution_arc=16.260204708, mode=Mode.SUBTRACT)
    with BuildSketch(Plane(origin=(0, 0, 28), x_dir=(-0.5999999999999953, -0.8000000000000035, 0), z_dir=(0.8000000000000035, -0.5999999999999953, 0))) as fase1_piece_43:
        Polygon((31 - FASE1_SIZE, 0), (31, FASE1_SIZE), (31, 0), align=None)
    revolve(axis=Axis((0, 0, 28), (0, 0, -1)), revolution_arc=16.260204708, mode=Mode.SUBTRACT)
    with BuildSketch(Plane(origin=(8.1e-08, -25.3, 18), x_dir=(0, -0.027495876610589005, 0.9996219169112968), z_dir=(-1, 0, 0))) as fase1_piece_44_section:
        Polygon((FASE1_SIZE * 0.999621916911, FASE1_SIZE * 0.0274958766106), (-FASE1_SIZE * 0.0274958766106, FASE1_SIZE * 0.999621916911), (0, 0), align=None)
    fase1_piece_44 = extrude(amount=17.100000081, mode=Mode.PRIVATE)
    fase1_piece_44 = fase1_piece_44 - Plane(origin=(0, 0, 18.17274178), x_dir=(1, 0, 0), z_dir=(0, 0, -1)) * Cylinder(25.3, 37, mode=Mode.PRIVATE)
    add(fase1_piece_44, mode=Mode.SUBTRACT)
    with BuildSketch(Plane(origin=(-17.1, -22.8, 18), x_dir=(0, -1, 0), z_dir=(1, 0, 0))) as fase1_piece_45:
        Polygon((2.5, -FASE1_SIZE), (2.5 - FASE1_SIZE, 0), (2.5, 0), align=None)
    revolve(axis=Axis((-17.1, -22.8, 18), (0, 0, -1)), revolution_arc=36.869897646, mode=Mode.SUBTRACT)


solid = part.part
